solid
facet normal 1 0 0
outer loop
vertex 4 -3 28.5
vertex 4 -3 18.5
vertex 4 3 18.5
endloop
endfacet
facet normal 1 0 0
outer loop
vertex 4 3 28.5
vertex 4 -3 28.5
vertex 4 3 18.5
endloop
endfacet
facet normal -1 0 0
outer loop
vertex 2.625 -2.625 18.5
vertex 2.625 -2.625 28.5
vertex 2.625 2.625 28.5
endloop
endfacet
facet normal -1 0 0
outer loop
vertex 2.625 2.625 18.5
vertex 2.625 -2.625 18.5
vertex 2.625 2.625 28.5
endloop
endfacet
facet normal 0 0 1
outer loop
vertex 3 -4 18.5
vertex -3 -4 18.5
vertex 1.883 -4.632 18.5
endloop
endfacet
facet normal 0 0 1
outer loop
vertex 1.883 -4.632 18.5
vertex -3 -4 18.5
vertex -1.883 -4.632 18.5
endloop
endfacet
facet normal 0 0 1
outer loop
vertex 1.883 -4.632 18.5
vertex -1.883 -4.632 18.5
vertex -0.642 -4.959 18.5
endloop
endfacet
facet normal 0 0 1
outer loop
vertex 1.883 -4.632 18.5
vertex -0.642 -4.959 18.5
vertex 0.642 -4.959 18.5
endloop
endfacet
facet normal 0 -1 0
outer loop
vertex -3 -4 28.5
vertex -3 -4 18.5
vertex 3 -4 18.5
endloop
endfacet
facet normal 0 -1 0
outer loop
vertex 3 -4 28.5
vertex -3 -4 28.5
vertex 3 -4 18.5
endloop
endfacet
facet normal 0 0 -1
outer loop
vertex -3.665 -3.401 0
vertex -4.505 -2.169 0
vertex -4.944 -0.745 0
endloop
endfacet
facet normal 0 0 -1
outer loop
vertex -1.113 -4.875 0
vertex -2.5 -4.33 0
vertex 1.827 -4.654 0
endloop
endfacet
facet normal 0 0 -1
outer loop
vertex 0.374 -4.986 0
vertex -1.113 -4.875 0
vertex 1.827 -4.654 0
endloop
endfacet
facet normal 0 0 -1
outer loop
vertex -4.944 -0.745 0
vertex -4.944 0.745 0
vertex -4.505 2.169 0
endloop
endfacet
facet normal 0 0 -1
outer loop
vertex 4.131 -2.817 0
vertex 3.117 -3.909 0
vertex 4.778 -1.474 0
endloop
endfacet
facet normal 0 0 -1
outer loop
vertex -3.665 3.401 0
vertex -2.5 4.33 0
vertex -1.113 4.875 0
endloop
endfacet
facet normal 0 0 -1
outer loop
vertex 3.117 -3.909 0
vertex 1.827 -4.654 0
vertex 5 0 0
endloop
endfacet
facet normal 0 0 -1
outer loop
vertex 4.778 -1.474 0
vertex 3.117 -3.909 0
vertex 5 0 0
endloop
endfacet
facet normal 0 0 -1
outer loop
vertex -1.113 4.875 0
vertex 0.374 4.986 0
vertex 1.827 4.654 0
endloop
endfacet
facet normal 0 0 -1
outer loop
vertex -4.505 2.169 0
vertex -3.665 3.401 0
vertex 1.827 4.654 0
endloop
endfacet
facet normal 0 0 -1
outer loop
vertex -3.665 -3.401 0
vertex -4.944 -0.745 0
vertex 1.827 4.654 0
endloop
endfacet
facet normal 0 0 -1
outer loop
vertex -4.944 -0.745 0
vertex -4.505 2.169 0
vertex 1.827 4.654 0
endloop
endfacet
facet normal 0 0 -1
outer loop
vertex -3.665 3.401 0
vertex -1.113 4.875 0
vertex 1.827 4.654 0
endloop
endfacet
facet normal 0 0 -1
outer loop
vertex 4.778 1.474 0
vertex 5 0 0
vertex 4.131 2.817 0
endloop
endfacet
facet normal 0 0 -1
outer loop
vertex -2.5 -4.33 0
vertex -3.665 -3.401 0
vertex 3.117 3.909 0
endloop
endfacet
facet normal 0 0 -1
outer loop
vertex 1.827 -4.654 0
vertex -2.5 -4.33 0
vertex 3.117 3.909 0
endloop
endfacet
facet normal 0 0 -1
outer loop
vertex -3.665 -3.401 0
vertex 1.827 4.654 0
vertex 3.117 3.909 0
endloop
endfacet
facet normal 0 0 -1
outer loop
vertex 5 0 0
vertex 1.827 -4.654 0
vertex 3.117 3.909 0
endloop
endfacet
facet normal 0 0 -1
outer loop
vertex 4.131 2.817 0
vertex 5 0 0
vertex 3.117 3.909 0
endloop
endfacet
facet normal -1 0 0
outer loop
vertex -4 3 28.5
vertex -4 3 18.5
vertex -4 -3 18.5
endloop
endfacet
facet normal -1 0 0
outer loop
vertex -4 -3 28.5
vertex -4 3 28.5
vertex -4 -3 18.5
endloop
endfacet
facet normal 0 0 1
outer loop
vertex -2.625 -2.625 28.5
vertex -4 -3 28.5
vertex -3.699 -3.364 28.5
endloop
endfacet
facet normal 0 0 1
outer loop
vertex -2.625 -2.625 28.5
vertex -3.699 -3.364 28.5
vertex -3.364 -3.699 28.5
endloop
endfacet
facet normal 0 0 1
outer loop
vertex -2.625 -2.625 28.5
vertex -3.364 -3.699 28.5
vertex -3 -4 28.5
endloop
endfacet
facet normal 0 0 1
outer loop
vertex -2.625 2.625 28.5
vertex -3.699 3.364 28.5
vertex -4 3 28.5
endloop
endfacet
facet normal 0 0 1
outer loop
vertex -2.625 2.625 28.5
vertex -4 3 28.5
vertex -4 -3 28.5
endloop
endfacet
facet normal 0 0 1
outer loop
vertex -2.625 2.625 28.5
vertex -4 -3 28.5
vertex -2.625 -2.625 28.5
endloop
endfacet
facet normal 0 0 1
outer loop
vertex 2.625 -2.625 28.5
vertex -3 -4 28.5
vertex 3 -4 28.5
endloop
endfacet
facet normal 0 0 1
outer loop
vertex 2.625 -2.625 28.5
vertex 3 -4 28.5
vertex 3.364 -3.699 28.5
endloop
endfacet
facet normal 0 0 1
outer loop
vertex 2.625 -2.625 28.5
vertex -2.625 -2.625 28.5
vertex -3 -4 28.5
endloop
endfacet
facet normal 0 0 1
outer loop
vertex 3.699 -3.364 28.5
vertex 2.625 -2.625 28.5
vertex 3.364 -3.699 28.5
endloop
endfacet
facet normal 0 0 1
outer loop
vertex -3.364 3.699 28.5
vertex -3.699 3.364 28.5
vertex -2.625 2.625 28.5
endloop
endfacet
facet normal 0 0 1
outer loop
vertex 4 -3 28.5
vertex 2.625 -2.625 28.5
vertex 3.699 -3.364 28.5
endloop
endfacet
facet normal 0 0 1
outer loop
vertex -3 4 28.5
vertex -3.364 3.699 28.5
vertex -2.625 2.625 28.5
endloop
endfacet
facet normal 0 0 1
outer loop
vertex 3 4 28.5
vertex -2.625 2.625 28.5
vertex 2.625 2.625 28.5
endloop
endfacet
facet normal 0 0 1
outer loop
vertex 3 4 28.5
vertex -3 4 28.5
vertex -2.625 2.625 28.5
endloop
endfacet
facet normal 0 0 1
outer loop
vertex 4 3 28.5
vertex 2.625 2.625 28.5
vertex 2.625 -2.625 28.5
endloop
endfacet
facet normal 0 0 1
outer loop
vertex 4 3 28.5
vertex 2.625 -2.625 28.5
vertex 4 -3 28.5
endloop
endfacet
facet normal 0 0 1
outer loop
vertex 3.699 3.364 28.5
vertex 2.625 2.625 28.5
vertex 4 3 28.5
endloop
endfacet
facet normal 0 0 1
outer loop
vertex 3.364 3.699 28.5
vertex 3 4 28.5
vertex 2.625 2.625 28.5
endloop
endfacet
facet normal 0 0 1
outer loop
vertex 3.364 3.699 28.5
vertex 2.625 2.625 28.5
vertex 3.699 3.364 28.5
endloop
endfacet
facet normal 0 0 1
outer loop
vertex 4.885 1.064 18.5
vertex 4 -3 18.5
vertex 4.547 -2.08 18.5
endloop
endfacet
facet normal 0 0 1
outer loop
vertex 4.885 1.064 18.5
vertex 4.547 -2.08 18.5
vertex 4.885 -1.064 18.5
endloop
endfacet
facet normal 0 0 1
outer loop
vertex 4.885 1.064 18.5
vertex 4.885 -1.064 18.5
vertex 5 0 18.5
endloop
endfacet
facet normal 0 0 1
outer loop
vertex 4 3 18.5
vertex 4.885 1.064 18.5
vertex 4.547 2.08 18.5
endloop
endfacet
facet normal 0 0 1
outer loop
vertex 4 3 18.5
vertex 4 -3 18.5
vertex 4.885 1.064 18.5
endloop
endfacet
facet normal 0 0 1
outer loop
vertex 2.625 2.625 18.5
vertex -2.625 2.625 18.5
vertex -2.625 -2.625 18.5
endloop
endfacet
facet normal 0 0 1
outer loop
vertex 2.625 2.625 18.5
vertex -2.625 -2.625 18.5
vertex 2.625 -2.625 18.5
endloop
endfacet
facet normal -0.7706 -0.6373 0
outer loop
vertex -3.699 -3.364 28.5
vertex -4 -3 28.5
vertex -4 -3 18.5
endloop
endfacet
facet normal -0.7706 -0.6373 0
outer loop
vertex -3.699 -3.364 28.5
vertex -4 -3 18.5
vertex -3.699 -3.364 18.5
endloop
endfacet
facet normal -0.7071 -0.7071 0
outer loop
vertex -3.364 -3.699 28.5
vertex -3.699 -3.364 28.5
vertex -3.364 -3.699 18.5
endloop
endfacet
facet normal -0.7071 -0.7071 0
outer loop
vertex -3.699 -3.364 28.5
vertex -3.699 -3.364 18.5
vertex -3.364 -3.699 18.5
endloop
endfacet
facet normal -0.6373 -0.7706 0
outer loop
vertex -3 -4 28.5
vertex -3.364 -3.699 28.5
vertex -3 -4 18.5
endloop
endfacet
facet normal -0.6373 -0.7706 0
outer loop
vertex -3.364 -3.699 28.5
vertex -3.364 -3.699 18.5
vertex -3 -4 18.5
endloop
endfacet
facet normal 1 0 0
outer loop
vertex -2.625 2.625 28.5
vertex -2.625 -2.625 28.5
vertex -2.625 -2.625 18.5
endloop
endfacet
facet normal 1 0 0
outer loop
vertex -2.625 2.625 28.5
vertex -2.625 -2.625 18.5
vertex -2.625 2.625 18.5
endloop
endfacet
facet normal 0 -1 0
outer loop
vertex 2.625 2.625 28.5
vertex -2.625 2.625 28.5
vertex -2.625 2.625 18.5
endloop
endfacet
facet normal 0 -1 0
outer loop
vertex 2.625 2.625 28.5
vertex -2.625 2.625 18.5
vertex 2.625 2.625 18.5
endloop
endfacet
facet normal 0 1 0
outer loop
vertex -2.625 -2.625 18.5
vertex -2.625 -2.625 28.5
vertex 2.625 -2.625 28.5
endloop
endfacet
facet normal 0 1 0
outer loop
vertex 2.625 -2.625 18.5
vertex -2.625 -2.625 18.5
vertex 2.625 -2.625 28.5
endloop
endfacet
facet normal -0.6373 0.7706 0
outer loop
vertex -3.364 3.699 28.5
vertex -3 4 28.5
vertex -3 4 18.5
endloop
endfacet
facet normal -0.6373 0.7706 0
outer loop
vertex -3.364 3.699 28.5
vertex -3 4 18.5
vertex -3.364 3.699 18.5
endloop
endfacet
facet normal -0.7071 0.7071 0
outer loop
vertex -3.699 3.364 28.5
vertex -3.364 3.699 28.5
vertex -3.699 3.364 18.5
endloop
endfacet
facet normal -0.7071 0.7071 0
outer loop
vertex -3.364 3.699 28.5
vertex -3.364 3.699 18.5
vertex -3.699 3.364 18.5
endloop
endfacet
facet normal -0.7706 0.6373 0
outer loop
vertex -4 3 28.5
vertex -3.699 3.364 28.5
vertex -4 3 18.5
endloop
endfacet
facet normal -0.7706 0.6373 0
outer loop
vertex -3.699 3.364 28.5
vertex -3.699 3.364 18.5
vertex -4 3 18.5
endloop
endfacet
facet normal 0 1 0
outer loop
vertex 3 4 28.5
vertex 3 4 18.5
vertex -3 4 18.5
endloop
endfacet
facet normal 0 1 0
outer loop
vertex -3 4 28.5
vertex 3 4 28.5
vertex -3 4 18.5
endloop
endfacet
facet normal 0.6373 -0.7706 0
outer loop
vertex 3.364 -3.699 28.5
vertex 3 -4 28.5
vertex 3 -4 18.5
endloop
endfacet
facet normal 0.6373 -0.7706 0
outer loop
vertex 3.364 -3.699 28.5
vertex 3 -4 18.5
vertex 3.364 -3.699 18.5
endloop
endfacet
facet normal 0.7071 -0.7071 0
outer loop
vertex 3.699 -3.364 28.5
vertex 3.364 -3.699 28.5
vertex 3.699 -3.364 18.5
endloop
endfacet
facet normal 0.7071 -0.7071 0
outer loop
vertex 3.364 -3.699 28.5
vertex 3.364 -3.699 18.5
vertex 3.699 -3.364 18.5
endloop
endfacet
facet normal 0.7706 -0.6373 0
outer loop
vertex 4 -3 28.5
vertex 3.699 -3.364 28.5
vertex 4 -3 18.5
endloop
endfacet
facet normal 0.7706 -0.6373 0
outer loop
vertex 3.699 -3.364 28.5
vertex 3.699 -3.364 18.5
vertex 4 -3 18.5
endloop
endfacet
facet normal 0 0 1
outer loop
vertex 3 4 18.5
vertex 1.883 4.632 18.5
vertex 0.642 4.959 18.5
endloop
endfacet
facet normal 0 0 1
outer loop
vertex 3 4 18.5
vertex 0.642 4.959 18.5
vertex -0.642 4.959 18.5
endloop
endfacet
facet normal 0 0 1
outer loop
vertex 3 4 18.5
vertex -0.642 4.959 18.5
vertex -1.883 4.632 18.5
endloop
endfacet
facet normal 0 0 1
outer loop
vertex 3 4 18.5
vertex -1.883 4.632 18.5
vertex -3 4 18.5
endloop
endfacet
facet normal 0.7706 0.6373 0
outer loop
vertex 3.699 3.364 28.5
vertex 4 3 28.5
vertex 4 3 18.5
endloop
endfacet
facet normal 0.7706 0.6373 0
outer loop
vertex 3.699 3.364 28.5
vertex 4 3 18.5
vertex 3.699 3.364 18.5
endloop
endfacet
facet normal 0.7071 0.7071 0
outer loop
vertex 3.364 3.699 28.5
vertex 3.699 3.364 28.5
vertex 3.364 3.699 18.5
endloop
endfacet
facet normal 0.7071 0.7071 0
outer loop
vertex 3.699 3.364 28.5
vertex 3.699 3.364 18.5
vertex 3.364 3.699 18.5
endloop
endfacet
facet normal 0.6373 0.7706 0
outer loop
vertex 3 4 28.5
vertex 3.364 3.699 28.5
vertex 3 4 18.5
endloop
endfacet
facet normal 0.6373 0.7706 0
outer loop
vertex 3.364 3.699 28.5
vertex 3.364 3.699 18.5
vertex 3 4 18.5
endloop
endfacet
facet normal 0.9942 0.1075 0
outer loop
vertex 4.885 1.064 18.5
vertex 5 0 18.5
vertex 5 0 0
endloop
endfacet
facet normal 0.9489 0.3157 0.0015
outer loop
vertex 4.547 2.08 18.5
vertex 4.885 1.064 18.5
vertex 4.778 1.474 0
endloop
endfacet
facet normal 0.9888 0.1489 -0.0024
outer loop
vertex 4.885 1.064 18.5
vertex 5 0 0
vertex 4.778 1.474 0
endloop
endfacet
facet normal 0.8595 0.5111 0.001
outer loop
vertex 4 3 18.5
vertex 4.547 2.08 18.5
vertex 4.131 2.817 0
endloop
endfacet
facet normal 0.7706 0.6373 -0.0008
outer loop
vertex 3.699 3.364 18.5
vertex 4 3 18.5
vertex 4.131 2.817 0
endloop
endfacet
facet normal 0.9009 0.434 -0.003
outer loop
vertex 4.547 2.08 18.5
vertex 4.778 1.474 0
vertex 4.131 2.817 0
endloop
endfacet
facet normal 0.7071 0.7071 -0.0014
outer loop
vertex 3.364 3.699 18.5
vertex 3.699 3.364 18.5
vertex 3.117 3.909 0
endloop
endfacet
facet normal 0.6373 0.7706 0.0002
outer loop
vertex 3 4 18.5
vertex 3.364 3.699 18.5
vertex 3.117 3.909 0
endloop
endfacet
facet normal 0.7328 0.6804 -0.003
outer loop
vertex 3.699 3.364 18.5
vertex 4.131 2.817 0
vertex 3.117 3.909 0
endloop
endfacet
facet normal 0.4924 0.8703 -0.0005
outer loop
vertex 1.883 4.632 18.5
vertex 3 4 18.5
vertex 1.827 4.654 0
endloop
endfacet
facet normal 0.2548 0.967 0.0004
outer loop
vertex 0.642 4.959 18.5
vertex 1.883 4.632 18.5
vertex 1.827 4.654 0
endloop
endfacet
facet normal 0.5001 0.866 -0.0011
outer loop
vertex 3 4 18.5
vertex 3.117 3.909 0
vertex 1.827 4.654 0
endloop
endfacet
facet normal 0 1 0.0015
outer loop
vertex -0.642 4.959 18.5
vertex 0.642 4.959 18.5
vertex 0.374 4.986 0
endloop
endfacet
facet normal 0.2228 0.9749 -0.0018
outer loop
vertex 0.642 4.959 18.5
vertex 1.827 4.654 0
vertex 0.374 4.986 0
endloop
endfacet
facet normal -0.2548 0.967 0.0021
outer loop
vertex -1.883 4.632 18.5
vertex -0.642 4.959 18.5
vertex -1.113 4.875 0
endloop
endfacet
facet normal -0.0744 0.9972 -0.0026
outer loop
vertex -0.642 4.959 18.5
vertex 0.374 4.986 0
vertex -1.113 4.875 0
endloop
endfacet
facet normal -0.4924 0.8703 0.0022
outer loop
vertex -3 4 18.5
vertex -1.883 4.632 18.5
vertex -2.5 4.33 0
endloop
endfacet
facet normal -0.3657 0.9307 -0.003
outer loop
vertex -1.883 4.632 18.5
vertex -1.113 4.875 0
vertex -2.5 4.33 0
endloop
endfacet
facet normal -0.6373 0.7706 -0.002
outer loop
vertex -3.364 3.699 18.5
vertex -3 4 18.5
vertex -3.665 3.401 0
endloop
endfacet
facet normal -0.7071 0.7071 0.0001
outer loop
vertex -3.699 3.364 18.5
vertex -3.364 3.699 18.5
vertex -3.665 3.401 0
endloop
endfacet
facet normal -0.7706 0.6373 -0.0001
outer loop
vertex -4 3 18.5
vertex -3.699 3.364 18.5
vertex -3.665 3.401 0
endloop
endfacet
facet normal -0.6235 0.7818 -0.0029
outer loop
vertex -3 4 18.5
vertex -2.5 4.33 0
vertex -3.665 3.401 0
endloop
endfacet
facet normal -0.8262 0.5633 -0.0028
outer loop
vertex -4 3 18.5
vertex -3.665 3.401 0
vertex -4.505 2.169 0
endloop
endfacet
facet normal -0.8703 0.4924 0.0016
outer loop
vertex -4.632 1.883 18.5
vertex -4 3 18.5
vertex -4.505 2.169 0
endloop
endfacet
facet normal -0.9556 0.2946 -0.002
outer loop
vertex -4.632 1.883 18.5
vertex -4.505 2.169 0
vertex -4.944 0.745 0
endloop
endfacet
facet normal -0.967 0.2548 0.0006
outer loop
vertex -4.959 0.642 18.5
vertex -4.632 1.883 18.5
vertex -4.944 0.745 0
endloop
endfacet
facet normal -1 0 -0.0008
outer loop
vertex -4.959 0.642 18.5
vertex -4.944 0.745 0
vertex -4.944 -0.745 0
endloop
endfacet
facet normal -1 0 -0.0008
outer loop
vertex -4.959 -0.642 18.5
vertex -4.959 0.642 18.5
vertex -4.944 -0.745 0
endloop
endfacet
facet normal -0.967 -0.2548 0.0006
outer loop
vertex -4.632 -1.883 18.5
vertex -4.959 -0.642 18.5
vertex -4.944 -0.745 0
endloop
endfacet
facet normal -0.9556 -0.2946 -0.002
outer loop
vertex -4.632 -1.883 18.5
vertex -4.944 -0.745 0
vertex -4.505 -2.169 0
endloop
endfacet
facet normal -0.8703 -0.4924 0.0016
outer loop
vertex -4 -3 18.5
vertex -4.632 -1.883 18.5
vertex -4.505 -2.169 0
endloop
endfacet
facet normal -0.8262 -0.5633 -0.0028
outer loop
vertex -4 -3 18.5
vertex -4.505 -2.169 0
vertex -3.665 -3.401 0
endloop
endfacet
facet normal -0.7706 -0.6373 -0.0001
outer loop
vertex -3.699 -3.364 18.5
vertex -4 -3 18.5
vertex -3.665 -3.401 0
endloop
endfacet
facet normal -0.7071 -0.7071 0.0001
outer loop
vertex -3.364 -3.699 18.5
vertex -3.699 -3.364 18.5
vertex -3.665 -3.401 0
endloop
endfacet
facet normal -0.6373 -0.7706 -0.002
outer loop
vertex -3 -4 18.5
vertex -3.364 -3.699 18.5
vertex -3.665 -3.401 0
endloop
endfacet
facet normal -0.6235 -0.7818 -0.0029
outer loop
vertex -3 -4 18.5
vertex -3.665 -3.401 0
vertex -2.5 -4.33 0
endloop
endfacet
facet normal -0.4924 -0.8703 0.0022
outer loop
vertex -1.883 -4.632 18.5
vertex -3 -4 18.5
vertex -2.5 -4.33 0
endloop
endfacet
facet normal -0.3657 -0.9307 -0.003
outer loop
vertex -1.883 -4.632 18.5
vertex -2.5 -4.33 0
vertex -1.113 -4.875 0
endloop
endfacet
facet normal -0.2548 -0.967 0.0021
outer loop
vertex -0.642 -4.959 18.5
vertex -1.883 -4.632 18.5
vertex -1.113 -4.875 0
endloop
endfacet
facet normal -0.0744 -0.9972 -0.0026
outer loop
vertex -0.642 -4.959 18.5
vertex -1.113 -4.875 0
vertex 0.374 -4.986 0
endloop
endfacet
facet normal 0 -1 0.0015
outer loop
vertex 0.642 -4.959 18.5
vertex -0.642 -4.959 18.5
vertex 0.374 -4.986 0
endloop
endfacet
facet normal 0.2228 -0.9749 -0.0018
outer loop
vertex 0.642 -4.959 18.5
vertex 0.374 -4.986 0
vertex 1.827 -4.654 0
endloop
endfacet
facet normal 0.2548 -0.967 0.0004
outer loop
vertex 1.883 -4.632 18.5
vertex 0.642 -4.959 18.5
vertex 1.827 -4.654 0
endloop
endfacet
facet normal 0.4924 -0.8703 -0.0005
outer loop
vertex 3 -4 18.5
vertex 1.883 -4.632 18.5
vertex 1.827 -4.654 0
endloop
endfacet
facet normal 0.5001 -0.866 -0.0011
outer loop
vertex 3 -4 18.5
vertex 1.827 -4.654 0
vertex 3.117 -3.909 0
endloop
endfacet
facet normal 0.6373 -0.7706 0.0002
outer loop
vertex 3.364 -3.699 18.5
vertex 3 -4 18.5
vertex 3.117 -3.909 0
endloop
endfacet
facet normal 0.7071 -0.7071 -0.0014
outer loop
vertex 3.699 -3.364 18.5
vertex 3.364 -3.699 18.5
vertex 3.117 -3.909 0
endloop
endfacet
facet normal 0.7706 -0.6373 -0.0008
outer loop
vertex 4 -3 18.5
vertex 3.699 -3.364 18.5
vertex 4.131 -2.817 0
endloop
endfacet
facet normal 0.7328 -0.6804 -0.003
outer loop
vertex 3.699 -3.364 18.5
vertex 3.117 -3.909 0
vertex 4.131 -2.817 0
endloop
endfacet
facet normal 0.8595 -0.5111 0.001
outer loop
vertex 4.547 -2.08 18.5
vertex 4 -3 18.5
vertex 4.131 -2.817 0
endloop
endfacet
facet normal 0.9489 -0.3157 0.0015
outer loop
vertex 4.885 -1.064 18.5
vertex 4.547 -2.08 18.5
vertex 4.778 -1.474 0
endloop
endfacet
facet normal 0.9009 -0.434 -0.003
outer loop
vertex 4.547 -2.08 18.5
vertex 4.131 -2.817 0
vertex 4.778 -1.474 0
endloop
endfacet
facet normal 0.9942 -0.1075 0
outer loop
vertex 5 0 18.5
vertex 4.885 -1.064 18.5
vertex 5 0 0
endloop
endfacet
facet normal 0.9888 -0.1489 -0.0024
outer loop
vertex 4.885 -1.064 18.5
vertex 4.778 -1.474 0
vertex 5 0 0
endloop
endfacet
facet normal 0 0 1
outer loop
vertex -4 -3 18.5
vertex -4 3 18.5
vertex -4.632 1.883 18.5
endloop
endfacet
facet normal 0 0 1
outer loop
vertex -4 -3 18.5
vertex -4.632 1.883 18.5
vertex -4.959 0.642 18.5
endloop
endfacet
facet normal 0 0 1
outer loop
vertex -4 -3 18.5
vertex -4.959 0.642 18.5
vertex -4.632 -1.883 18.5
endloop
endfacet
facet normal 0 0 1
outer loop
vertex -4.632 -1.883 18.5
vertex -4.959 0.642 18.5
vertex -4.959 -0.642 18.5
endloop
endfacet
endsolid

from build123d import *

# Parameters (mm, degrees)
SKETCH1_R           = 5
BOSS_EXTRUDE1_DEPTH = 18.5
BOSS_EXTRUDE2_DEPTH = 10
SKETCH4_W           = 5.25
SKETCH4_H           = 5.25
CUT_EXTRUDE2_DEPTH  = 10


with BuildPart() as part:
    # Sketch1 → Boss-Extrude1 (new body)
    with BuildSketch(Plane.XY):
        Circle(SKETCH1_R)
    extrude(amount=BOSS_EXTRUDE1_DEPTH)

    # Sketch3 → Boss-Extrude2 (add)
    with BuildSketch(Plane.XY.offset(18.5)):
        with BuildLine():
            ThreePointArc((-4, -3), (-3.535533906, -3.535533906), (-3, -4))
            Line((-3, -4), (3, -4))
            ThreePointArc((3, -4), (3.535533906, -3.535533906), (4, -3))
            Line((4, -3), (4, 3))
            ThreePointArc((4, 3), (3.535533906, 3.535533906), (3, 4))
            Line((3, 4), (-3, 4))
            ThreePointArc((-3, 4), (-3.535533906, 3.535533906), (-4, 3))
            Line((-4, 3), (-4, -3))
        make_face()
    extrude(amount=BOSS_EXTRUDE2_DEPTH)

    # Sketch4 → Cut-Extrude2 (cut)
    with BuildSketch(Plane.XY.offset(28.5)):
        Rectangle(SKETCH4_W, SKETCH4_H)
    extrude(amount=-CUT_EXTRUDE2_DEPTH, mode=Mode.SUBTRACT)


solid = part.part
